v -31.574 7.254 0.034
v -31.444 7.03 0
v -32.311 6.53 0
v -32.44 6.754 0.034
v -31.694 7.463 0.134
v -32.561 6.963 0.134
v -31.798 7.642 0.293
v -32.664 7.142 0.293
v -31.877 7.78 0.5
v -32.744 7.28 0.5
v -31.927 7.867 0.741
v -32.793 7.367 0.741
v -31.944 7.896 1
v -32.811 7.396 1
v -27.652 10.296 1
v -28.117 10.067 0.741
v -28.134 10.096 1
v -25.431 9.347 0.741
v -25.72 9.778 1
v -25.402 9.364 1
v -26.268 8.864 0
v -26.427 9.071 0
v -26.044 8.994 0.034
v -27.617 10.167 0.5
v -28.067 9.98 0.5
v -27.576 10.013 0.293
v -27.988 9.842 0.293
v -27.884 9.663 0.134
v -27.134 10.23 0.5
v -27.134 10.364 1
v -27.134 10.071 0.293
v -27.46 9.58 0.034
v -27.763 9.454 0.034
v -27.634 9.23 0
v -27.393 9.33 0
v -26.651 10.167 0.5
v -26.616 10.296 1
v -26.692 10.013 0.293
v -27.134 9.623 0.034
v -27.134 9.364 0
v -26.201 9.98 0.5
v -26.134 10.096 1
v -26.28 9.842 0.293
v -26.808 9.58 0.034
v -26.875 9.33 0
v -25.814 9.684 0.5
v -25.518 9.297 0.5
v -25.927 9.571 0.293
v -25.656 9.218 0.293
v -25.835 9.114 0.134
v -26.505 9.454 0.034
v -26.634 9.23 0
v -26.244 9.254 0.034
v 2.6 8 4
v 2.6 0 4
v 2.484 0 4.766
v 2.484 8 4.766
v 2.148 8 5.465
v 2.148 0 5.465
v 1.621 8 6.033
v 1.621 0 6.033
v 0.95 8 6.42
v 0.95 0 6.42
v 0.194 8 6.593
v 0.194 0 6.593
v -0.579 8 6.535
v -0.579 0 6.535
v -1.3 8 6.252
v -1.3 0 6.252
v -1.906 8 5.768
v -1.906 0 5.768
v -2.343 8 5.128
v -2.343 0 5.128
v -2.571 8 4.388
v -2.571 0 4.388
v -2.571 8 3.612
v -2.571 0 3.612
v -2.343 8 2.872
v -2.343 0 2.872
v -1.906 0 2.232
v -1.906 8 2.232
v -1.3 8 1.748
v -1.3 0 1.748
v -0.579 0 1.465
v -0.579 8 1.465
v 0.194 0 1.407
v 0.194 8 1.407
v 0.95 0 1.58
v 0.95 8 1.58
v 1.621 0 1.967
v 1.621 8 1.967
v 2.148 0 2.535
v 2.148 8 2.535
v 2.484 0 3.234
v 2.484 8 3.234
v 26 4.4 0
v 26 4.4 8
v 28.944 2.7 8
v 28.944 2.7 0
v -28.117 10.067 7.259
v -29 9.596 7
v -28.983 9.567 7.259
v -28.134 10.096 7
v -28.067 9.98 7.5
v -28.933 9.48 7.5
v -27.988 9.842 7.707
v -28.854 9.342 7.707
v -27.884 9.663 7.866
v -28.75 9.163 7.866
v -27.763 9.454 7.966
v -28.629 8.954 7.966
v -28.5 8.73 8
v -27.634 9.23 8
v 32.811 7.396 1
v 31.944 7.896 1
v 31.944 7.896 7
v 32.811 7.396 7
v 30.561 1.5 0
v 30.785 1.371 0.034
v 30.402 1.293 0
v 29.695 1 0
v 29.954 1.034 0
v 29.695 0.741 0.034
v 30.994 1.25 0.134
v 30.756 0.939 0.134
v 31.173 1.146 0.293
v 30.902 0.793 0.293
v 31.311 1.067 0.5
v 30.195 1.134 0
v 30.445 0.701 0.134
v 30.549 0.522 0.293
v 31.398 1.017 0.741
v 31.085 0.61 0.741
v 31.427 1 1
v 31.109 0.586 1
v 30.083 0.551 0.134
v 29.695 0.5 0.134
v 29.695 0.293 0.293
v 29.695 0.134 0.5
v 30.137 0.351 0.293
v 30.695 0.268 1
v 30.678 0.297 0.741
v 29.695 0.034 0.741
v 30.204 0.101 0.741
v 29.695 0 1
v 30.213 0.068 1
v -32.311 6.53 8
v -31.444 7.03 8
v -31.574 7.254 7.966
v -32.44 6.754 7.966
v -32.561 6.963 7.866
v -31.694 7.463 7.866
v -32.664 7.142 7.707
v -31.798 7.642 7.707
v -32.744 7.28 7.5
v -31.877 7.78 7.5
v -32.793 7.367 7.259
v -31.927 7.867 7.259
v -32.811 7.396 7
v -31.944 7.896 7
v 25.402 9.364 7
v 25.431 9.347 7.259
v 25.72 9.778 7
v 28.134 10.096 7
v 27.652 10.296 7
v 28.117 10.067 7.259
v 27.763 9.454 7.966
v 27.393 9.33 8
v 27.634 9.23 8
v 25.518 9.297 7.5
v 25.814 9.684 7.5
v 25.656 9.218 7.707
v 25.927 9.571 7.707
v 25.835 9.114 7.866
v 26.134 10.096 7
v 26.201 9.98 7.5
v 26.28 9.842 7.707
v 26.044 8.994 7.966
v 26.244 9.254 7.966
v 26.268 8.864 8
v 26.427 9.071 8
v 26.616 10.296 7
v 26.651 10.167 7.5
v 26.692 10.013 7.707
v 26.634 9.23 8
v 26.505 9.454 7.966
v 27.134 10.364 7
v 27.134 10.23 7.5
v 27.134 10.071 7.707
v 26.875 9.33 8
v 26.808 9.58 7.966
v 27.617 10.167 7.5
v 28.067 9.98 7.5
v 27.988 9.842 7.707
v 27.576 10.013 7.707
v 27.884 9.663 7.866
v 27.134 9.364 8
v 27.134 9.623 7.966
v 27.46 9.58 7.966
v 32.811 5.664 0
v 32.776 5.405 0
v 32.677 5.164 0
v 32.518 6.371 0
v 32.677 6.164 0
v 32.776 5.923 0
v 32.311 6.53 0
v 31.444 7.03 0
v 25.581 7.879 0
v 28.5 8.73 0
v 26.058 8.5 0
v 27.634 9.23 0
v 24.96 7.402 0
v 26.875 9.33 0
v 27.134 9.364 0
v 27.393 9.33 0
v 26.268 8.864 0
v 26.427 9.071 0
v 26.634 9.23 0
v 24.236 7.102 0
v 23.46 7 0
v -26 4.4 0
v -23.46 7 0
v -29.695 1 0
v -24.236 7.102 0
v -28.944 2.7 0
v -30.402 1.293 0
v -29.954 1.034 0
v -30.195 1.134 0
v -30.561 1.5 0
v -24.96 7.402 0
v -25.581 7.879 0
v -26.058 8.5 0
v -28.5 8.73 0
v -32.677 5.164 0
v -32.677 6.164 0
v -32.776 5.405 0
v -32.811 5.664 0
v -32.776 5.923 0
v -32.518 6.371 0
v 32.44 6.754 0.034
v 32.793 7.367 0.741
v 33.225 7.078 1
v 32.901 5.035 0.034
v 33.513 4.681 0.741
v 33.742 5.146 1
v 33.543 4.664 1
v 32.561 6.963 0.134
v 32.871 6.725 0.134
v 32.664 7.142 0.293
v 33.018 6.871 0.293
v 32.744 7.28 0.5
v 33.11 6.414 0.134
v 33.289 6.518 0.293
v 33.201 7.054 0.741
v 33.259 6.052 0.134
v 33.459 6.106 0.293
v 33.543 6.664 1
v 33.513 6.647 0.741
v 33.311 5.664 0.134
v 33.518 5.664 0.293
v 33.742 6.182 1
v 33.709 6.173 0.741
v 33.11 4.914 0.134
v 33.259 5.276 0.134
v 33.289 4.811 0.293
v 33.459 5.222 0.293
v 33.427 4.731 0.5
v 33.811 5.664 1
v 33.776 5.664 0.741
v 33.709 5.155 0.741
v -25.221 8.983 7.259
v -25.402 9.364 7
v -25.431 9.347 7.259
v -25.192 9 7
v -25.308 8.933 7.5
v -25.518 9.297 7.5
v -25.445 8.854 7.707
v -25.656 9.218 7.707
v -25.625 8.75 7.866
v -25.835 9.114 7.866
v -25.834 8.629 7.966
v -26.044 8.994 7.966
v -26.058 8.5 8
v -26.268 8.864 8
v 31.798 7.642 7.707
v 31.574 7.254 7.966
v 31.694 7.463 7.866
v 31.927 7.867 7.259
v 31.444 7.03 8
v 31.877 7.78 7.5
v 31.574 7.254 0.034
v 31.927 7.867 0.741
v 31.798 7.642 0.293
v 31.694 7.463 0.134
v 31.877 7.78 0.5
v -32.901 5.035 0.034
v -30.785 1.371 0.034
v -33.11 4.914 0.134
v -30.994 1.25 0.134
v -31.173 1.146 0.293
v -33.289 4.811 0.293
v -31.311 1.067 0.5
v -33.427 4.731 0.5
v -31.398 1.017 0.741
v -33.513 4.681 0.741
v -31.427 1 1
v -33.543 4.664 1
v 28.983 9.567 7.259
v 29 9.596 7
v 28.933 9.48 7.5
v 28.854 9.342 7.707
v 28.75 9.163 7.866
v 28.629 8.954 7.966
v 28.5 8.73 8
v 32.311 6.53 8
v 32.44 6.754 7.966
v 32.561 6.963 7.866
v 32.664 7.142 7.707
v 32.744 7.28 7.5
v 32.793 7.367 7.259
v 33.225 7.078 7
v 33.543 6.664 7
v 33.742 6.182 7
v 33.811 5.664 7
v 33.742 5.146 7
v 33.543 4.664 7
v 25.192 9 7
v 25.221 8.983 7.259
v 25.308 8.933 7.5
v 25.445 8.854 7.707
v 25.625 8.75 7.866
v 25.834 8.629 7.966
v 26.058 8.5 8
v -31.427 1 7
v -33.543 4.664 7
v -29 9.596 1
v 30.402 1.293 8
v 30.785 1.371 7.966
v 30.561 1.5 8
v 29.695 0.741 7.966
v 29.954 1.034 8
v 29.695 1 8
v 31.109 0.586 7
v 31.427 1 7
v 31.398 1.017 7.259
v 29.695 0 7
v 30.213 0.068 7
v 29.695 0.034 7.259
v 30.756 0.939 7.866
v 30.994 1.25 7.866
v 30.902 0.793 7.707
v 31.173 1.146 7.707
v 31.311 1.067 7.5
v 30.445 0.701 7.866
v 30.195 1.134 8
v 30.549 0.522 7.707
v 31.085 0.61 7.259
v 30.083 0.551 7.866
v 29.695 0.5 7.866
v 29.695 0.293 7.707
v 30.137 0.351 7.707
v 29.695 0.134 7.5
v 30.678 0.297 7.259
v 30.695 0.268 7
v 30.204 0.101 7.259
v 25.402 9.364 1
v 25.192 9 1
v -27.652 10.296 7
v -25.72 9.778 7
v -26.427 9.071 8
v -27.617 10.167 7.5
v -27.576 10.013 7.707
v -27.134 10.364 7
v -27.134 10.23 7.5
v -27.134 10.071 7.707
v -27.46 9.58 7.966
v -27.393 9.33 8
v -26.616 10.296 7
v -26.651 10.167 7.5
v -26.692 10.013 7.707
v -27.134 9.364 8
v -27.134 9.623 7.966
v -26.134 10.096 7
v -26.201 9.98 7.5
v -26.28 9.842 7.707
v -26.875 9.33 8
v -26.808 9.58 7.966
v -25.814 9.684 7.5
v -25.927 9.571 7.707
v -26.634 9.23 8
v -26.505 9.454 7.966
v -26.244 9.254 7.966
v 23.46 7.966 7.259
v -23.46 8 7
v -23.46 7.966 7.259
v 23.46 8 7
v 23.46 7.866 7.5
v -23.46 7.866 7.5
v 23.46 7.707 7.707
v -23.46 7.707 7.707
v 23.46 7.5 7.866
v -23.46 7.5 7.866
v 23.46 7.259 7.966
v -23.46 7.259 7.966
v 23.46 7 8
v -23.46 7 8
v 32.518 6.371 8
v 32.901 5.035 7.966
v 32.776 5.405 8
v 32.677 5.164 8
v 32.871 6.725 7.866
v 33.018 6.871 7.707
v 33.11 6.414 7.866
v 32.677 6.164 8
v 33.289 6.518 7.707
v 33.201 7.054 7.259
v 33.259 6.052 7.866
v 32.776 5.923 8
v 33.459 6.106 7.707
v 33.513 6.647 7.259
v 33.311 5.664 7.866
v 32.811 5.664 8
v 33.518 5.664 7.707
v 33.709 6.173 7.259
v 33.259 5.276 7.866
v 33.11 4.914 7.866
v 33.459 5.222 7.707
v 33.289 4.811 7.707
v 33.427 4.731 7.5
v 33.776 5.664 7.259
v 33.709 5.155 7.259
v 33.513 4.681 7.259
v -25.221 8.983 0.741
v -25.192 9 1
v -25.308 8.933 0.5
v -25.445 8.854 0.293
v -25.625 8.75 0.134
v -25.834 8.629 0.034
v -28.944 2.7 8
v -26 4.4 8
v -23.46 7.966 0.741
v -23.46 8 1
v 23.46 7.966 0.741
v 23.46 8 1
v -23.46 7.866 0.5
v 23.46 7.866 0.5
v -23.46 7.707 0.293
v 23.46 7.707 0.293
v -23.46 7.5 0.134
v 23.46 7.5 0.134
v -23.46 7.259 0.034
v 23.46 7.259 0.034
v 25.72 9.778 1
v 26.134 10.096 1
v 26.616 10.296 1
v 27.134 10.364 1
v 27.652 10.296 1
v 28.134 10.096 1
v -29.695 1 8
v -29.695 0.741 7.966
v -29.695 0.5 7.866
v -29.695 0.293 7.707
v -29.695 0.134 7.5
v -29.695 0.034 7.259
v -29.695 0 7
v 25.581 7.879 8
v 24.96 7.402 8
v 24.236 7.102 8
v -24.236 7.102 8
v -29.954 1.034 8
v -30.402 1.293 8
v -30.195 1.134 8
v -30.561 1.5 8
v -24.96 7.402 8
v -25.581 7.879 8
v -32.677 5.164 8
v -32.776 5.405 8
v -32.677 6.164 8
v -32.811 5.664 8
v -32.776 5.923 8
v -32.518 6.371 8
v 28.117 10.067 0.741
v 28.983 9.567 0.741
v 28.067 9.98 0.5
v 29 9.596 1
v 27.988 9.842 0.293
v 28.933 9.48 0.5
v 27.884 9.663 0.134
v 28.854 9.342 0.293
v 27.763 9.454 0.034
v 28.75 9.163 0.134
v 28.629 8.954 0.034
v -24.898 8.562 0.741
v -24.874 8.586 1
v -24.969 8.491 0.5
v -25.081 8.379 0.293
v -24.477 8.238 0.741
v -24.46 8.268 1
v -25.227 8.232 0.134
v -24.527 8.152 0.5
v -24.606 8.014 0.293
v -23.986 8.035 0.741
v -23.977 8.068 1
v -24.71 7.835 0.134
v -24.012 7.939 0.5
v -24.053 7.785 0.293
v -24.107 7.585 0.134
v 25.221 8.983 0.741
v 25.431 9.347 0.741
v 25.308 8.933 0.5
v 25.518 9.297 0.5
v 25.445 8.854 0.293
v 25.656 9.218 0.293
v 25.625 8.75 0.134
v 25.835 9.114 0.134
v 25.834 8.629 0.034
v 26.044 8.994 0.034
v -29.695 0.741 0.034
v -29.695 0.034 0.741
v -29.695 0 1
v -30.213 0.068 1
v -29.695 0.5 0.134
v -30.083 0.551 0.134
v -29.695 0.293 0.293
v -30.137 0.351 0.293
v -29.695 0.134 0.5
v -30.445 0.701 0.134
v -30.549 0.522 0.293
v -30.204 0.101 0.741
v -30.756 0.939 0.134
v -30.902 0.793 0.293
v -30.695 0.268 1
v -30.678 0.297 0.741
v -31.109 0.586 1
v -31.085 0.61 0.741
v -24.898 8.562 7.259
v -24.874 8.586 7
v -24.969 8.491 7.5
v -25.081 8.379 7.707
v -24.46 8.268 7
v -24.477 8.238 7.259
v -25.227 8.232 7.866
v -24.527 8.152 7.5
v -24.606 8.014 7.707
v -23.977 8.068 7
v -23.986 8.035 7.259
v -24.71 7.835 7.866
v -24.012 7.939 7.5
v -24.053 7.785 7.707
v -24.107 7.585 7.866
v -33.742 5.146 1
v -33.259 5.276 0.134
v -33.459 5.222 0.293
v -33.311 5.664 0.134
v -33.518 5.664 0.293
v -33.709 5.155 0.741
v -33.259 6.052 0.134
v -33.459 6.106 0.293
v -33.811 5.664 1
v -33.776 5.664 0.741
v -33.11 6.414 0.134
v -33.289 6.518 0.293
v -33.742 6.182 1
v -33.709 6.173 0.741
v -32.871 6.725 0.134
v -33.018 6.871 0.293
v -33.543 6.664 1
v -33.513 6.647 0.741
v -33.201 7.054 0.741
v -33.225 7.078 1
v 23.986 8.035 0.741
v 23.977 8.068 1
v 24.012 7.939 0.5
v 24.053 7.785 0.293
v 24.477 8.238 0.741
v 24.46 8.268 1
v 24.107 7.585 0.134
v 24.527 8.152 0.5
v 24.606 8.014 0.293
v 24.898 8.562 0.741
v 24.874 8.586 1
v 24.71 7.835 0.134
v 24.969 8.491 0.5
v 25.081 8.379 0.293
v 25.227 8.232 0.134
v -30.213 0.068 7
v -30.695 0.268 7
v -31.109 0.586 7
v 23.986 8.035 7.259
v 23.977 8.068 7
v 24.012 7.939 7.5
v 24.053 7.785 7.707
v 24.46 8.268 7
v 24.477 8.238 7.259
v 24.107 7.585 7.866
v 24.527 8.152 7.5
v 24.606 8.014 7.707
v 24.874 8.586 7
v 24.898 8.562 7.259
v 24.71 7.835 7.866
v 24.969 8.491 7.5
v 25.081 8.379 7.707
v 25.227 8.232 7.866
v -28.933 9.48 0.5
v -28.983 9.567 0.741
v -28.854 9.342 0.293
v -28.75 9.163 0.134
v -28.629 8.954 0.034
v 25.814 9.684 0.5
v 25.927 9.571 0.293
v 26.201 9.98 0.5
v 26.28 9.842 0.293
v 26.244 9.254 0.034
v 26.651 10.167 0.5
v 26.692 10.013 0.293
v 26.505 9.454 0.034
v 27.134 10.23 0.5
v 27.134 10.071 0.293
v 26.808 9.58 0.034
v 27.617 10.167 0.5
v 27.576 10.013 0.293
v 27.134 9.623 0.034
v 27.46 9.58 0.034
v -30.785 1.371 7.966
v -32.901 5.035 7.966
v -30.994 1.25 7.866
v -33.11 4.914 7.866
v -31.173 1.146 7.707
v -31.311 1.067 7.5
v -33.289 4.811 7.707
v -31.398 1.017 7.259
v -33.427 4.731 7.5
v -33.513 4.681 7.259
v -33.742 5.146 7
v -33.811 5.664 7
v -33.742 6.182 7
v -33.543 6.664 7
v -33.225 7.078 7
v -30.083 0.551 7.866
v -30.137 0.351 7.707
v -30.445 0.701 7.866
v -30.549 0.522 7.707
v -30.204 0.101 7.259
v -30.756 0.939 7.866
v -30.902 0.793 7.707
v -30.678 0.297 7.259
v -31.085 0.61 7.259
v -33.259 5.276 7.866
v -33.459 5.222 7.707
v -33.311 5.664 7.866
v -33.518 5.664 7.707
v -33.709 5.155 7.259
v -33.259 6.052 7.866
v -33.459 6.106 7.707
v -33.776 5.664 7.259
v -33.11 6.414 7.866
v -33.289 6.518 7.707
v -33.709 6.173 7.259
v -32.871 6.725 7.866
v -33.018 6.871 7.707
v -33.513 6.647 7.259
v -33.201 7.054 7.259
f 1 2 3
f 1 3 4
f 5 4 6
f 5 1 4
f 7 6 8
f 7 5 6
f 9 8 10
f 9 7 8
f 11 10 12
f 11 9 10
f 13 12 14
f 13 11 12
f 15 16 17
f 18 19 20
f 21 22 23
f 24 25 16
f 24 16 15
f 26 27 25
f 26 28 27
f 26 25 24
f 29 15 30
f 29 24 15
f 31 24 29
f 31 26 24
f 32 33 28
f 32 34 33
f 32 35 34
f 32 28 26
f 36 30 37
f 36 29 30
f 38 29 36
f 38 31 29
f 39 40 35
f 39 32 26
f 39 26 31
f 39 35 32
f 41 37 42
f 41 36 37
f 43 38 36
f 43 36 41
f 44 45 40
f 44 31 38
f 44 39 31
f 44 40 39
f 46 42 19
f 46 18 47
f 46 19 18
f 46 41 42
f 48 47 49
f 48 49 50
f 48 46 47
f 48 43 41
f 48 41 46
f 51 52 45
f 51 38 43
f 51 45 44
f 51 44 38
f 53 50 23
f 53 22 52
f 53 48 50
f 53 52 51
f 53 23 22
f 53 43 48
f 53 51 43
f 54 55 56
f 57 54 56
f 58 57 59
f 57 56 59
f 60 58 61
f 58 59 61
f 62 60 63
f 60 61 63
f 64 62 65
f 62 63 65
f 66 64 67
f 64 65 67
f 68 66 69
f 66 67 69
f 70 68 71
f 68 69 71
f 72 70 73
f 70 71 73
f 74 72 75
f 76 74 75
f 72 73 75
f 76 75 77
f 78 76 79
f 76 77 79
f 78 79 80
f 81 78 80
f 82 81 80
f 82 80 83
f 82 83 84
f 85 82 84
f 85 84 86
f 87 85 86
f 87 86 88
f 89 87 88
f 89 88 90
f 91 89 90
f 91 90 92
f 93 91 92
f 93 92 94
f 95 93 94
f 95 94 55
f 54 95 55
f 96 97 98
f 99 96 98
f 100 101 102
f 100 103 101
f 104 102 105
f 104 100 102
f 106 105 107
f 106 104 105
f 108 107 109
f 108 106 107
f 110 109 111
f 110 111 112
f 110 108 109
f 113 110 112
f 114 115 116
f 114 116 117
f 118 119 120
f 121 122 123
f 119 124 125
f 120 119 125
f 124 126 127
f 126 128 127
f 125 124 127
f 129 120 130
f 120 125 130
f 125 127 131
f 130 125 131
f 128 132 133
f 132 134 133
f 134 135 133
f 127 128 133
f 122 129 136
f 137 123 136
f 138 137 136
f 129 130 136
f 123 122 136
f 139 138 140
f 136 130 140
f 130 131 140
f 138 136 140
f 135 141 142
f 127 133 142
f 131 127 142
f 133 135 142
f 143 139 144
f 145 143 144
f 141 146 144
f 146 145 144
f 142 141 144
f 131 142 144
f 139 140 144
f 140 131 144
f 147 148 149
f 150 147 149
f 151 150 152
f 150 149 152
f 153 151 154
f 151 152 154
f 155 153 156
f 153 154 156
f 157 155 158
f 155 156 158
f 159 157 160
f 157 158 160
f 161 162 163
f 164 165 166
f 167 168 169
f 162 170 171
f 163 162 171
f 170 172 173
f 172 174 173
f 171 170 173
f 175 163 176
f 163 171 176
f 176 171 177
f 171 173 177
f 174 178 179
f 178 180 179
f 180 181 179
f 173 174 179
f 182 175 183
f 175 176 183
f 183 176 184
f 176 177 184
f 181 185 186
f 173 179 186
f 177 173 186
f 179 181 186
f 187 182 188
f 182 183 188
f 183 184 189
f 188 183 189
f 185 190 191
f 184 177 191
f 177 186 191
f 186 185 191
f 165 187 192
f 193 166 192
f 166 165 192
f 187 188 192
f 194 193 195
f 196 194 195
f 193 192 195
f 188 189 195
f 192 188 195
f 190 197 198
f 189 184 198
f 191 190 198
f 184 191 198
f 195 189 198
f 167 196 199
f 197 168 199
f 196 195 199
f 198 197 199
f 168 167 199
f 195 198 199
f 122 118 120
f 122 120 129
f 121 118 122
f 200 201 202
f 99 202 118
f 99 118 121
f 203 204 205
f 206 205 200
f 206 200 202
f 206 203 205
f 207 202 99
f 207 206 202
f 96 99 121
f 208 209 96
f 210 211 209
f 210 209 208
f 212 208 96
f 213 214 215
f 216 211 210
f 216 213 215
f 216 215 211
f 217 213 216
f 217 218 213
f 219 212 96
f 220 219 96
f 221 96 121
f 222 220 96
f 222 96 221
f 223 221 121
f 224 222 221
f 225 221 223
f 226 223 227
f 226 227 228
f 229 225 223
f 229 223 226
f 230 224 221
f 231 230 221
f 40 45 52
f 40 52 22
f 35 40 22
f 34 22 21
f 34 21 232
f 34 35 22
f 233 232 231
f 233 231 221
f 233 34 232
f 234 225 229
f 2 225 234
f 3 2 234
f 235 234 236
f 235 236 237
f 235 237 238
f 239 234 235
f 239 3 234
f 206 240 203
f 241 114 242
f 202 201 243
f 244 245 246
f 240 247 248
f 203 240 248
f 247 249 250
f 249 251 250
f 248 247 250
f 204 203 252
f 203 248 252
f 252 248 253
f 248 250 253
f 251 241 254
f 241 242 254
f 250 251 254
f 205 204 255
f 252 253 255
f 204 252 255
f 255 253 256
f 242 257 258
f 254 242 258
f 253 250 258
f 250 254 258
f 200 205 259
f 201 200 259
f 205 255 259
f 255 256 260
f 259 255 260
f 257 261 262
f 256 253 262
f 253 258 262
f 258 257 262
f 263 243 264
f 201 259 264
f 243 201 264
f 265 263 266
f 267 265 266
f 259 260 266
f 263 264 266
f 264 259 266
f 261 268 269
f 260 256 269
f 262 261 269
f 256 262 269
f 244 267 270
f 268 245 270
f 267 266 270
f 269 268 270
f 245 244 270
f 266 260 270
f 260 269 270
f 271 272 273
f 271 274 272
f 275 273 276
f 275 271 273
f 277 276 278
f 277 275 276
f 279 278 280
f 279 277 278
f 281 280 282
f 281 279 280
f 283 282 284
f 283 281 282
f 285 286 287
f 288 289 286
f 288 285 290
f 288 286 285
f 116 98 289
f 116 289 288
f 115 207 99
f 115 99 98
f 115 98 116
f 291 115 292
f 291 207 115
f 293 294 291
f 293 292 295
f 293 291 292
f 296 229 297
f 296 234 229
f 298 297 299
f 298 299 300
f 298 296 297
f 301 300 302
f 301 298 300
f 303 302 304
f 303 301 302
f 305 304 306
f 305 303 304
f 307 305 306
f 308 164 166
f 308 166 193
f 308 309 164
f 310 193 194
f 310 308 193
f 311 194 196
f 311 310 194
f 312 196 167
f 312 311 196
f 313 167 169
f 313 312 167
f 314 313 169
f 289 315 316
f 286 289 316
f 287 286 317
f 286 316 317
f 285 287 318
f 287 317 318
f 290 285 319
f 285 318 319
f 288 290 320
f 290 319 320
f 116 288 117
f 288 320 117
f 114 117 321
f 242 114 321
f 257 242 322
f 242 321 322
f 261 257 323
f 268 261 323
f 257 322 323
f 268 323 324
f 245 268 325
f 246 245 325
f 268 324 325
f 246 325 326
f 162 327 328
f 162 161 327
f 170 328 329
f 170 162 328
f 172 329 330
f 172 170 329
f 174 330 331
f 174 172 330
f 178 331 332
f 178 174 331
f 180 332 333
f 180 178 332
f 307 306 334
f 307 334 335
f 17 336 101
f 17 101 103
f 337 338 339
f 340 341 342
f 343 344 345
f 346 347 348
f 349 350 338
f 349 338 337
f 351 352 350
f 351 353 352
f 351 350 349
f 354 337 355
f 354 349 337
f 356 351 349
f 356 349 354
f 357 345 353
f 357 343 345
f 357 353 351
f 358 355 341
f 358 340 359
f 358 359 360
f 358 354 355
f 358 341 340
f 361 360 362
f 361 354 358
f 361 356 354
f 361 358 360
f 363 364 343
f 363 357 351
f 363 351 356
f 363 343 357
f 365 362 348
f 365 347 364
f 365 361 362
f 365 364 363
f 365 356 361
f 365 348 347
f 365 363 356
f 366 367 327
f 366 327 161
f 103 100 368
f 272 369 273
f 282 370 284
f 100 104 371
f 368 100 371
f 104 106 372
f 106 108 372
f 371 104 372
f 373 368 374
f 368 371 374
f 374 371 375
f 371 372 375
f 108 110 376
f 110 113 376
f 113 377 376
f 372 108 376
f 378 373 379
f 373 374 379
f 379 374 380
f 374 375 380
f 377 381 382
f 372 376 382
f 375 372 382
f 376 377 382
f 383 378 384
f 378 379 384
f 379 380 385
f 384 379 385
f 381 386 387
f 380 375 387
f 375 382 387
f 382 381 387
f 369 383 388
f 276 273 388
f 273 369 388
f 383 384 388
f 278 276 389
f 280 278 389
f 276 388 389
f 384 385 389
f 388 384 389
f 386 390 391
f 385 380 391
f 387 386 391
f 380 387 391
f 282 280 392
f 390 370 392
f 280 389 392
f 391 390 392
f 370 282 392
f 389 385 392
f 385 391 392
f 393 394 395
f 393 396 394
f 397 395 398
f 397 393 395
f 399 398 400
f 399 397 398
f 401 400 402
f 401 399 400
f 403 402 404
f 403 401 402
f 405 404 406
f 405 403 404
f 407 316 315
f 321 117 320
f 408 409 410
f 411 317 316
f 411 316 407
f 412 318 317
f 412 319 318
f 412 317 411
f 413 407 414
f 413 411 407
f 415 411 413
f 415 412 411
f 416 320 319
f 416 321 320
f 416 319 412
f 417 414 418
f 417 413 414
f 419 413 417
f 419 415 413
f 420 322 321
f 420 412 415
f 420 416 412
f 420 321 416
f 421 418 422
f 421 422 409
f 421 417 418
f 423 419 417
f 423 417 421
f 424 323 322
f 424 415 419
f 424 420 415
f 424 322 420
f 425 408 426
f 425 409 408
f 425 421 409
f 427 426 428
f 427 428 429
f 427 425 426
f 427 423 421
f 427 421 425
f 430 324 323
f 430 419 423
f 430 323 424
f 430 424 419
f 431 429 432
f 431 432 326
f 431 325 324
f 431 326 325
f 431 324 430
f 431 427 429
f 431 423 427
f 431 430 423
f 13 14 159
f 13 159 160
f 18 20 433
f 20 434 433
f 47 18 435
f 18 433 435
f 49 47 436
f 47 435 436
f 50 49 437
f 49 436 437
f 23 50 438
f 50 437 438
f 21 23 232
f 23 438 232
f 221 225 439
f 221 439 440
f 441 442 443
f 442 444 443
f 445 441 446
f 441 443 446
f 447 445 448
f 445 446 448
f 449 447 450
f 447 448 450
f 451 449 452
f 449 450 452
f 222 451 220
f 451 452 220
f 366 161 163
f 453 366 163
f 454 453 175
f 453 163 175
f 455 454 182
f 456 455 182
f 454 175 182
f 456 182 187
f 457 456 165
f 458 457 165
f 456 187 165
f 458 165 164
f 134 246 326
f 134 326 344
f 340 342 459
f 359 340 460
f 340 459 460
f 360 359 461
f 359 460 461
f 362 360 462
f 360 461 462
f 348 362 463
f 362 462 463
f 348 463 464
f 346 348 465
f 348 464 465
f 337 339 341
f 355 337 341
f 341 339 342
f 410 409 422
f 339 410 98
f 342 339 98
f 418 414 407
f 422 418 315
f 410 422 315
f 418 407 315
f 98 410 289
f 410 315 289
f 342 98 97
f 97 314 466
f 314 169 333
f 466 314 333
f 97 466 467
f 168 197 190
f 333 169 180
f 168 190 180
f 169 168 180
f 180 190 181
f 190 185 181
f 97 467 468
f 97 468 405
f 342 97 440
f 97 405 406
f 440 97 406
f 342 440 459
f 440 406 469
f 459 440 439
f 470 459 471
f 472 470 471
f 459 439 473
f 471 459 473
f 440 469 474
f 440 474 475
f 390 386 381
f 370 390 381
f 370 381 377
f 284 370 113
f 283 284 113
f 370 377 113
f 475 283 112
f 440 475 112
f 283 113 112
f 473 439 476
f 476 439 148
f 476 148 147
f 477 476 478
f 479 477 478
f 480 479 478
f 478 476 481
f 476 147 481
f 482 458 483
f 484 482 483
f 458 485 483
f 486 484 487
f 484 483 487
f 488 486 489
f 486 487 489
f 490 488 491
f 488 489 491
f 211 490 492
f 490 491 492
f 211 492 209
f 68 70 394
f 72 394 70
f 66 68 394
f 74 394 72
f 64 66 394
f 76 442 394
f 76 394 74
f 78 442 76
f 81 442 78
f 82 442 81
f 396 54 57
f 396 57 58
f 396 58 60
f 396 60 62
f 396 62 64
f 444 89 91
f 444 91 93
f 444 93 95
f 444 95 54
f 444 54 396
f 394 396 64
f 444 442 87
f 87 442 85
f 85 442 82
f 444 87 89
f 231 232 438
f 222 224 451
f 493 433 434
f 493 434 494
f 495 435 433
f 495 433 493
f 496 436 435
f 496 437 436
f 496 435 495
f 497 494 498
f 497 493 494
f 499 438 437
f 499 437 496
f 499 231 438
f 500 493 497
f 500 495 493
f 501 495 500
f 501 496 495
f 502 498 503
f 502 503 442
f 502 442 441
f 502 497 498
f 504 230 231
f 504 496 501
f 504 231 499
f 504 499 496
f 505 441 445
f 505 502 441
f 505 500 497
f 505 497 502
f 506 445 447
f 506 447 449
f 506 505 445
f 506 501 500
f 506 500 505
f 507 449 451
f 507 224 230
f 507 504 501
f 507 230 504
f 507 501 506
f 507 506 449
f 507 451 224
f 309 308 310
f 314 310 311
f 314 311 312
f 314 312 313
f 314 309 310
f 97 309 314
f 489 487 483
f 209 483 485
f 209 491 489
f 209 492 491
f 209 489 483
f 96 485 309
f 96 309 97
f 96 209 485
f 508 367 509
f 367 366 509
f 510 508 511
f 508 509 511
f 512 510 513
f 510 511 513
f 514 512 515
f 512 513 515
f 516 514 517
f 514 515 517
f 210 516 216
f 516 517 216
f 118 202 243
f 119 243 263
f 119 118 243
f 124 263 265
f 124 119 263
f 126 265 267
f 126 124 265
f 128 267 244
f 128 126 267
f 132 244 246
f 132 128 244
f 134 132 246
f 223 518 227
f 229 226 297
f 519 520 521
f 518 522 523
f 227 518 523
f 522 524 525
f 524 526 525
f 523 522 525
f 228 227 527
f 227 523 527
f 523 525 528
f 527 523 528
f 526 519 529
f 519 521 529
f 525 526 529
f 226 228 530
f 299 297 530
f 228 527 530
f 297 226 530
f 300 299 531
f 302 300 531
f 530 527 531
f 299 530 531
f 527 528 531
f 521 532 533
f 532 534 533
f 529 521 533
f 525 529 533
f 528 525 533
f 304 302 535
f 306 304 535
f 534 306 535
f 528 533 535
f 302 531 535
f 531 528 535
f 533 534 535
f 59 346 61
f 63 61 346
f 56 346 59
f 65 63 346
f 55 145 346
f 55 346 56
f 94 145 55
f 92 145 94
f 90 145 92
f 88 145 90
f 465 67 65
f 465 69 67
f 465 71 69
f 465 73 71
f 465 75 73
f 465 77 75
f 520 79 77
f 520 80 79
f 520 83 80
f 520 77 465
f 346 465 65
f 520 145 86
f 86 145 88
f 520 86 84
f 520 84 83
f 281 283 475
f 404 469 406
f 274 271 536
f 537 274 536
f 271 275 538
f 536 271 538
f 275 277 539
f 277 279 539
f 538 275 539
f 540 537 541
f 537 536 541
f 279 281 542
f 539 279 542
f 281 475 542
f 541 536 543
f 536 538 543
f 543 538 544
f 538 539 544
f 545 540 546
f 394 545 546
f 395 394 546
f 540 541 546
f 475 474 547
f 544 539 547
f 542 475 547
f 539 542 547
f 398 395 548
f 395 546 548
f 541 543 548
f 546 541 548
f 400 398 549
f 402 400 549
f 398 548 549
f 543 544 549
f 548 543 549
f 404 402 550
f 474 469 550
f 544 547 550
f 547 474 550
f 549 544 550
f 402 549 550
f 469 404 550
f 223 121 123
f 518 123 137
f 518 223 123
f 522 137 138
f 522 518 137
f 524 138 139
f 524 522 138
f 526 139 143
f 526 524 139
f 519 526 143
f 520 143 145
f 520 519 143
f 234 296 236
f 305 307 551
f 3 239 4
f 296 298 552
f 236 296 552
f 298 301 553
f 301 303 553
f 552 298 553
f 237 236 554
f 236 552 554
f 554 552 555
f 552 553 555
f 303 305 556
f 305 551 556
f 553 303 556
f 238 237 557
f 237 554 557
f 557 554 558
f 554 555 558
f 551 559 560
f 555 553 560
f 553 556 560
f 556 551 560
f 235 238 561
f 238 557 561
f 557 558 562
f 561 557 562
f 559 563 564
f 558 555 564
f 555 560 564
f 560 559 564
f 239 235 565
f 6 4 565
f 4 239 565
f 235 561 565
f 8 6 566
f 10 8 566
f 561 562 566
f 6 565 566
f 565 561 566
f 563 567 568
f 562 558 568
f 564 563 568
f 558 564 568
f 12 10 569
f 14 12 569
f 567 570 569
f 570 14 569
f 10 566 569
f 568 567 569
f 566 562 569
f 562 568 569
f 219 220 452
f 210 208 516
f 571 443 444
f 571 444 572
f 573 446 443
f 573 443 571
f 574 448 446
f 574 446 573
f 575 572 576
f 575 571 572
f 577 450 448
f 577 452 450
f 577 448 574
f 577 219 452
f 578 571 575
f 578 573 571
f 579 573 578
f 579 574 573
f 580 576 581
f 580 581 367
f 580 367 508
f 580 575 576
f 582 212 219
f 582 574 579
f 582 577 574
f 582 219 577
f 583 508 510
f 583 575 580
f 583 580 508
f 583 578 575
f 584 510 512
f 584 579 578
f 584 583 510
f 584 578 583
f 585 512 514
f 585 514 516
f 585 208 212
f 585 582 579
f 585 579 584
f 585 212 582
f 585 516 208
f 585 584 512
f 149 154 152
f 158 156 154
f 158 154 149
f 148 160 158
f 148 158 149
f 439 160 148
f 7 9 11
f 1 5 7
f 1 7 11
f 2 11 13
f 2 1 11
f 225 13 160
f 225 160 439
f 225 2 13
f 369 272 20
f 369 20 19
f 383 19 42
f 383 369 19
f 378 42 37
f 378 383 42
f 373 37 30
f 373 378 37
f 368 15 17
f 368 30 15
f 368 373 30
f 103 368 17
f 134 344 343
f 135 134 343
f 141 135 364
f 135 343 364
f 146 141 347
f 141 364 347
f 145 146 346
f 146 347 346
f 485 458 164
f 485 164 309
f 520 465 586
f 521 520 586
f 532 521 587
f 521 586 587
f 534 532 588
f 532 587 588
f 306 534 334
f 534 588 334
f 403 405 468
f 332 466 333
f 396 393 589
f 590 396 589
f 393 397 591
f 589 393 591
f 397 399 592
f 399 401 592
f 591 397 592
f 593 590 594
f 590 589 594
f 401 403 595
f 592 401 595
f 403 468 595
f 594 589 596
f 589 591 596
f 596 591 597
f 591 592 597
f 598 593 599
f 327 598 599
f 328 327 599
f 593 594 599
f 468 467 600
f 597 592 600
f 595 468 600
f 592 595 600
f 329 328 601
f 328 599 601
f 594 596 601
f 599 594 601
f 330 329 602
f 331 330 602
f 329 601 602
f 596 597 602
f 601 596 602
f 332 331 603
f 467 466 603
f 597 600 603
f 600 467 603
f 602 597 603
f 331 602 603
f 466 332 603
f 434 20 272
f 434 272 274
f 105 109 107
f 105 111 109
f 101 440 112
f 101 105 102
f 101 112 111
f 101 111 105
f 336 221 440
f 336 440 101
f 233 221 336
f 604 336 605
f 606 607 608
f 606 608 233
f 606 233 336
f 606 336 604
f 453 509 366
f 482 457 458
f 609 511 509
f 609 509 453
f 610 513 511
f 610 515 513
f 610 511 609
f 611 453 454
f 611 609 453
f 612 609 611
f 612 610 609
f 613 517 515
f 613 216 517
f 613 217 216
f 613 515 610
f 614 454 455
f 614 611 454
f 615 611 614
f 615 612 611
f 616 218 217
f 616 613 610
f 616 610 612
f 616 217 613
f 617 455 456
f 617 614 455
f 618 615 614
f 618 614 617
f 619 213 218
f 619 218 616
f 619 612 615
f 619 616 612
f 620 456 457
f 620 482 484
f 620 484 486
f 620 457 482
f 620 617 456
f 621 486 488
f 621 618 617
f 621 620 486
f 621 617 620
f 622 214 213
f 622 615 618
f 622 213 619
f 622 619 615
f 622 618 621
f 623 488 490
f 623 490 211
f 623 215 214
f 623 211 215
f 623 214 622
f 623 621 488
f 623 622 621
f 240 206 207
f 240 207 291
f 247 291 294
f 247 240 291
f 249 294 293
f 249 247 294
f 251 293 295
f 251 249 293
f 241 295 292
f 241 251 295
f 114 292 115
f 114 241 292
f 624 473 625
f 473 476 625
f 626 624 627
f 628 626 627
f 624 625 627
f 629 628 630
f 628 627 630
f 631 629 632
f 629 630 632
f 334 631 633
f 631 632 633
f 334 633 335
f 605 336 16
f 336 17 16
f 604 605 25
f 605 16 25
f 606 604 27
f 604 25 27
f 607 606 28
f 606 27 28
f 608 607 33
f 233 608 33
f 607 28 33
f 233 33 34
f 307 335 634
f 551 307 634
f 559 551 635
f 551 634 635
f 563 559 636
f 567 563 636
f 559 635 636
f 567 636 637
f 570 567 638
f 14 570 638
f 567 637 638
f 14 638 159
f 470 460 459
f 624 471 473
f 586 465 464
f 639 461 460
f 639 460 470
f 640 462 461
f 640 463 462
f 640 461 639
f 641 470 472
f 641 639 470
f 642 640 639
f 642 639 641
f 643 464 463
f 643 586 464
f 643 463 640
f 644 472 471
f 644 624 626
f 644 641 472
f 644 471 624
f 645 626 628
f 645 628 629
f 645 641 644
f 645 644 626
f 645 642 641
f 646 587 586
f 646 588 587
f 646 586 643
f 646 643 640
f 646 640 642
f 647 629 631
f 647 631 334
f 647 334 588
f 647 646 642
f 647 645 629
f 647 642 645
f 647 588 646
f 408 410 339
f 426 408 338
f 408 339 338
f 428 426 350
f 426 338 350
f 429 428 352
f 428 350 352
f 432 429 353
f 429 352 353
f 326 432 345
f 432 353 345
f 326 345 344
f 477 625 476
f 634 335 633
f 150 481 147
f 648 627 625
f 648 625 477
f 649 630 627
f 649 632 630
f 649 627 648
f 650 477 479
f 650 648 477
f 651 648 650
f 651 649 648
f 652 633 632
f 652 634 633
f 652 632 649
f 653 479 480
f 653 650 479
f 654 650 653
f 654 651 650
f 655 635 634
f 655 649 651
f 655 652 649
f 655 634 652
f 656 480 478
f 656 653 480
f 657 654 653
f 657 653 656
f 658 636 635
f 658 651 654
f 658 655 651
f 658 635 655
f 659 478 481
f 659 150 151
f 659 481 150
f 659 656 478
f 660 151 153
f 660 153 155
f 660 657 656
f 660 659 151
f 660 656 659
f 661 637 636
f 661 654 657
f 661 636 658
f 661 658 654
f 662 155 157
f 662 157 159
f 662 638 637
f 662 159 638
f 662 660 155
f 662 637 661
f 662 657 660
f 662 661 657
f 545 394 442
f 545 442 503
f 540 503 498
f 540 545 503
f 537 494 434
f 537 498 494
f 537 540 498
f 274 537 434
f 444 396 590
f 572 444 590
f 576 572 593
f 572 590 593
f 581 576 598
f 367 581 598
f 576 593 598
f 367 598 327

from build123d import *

# Parameters (mm, degrees)
PAD_DEPTH    = 8
SKETCH001_R  = 2.6
POCKET_DEPTH = 11.097152
FILLET_R     = 2
FILLET001_R  = 1


with BuildPart() as part:
    # Sketch → Pad (new body)
    with BuildSketch(Plane.XY):
        Polygon((-24.614359, 8), (24.614359, 8), (26.401924, 11.096152), (29, 9.596152), (26, 4.4), (28.944486, 2.7), (31.944486, 7.896152), (34.542563, 6.396152), (30.849742, 0), (-30.849742, 0), (-34.542563, 6.396152), (-31.944486, 7.896152), (-28.944486, 2.7), (-26, 4.4), (-29, 9.596152), (-26.401924, 11.096152), align=None)
    extrude(amount=PAD_DEPTH)

    # Sketch001 → Pocket (cut, through all)
    with BuildSketch(Plane.XZ):
        with Locations((0, 4)):
            Circle(SKETCH001_R)
    extrude(amount=-POCKET_DEPTH, mode=Mode.SUBTRACT)

    # Fillet
    fillet_edges = [part.edges().sort_by_distance(p)[0] for p in [
        (-30.849742, 0, 4),
        (-24.614359, 8, 4),
        (24.614359, 8, 4),
        (30.849742, 0, 4),
        (34.542563, 6.396152, 4),
        (26.401924, 11.096152, 4),
        (-26.401924, 11.096152, 4),
        (-34.542563, 6.396152, 4),
    ]]
    fillet(fillet_edges, radius=FILLET_R)

    # Fillet001
    fillet001_edges = [part.edges().sort_by_distance(p)[0] for p in [
        (0, 8, 0),
        (0, 0, 0),
        (0, 8, 8),
        (0, 0, 8),
    ]]
    fillet(fillet001_edges, radius=FILLET001_R)


solid = part.part
